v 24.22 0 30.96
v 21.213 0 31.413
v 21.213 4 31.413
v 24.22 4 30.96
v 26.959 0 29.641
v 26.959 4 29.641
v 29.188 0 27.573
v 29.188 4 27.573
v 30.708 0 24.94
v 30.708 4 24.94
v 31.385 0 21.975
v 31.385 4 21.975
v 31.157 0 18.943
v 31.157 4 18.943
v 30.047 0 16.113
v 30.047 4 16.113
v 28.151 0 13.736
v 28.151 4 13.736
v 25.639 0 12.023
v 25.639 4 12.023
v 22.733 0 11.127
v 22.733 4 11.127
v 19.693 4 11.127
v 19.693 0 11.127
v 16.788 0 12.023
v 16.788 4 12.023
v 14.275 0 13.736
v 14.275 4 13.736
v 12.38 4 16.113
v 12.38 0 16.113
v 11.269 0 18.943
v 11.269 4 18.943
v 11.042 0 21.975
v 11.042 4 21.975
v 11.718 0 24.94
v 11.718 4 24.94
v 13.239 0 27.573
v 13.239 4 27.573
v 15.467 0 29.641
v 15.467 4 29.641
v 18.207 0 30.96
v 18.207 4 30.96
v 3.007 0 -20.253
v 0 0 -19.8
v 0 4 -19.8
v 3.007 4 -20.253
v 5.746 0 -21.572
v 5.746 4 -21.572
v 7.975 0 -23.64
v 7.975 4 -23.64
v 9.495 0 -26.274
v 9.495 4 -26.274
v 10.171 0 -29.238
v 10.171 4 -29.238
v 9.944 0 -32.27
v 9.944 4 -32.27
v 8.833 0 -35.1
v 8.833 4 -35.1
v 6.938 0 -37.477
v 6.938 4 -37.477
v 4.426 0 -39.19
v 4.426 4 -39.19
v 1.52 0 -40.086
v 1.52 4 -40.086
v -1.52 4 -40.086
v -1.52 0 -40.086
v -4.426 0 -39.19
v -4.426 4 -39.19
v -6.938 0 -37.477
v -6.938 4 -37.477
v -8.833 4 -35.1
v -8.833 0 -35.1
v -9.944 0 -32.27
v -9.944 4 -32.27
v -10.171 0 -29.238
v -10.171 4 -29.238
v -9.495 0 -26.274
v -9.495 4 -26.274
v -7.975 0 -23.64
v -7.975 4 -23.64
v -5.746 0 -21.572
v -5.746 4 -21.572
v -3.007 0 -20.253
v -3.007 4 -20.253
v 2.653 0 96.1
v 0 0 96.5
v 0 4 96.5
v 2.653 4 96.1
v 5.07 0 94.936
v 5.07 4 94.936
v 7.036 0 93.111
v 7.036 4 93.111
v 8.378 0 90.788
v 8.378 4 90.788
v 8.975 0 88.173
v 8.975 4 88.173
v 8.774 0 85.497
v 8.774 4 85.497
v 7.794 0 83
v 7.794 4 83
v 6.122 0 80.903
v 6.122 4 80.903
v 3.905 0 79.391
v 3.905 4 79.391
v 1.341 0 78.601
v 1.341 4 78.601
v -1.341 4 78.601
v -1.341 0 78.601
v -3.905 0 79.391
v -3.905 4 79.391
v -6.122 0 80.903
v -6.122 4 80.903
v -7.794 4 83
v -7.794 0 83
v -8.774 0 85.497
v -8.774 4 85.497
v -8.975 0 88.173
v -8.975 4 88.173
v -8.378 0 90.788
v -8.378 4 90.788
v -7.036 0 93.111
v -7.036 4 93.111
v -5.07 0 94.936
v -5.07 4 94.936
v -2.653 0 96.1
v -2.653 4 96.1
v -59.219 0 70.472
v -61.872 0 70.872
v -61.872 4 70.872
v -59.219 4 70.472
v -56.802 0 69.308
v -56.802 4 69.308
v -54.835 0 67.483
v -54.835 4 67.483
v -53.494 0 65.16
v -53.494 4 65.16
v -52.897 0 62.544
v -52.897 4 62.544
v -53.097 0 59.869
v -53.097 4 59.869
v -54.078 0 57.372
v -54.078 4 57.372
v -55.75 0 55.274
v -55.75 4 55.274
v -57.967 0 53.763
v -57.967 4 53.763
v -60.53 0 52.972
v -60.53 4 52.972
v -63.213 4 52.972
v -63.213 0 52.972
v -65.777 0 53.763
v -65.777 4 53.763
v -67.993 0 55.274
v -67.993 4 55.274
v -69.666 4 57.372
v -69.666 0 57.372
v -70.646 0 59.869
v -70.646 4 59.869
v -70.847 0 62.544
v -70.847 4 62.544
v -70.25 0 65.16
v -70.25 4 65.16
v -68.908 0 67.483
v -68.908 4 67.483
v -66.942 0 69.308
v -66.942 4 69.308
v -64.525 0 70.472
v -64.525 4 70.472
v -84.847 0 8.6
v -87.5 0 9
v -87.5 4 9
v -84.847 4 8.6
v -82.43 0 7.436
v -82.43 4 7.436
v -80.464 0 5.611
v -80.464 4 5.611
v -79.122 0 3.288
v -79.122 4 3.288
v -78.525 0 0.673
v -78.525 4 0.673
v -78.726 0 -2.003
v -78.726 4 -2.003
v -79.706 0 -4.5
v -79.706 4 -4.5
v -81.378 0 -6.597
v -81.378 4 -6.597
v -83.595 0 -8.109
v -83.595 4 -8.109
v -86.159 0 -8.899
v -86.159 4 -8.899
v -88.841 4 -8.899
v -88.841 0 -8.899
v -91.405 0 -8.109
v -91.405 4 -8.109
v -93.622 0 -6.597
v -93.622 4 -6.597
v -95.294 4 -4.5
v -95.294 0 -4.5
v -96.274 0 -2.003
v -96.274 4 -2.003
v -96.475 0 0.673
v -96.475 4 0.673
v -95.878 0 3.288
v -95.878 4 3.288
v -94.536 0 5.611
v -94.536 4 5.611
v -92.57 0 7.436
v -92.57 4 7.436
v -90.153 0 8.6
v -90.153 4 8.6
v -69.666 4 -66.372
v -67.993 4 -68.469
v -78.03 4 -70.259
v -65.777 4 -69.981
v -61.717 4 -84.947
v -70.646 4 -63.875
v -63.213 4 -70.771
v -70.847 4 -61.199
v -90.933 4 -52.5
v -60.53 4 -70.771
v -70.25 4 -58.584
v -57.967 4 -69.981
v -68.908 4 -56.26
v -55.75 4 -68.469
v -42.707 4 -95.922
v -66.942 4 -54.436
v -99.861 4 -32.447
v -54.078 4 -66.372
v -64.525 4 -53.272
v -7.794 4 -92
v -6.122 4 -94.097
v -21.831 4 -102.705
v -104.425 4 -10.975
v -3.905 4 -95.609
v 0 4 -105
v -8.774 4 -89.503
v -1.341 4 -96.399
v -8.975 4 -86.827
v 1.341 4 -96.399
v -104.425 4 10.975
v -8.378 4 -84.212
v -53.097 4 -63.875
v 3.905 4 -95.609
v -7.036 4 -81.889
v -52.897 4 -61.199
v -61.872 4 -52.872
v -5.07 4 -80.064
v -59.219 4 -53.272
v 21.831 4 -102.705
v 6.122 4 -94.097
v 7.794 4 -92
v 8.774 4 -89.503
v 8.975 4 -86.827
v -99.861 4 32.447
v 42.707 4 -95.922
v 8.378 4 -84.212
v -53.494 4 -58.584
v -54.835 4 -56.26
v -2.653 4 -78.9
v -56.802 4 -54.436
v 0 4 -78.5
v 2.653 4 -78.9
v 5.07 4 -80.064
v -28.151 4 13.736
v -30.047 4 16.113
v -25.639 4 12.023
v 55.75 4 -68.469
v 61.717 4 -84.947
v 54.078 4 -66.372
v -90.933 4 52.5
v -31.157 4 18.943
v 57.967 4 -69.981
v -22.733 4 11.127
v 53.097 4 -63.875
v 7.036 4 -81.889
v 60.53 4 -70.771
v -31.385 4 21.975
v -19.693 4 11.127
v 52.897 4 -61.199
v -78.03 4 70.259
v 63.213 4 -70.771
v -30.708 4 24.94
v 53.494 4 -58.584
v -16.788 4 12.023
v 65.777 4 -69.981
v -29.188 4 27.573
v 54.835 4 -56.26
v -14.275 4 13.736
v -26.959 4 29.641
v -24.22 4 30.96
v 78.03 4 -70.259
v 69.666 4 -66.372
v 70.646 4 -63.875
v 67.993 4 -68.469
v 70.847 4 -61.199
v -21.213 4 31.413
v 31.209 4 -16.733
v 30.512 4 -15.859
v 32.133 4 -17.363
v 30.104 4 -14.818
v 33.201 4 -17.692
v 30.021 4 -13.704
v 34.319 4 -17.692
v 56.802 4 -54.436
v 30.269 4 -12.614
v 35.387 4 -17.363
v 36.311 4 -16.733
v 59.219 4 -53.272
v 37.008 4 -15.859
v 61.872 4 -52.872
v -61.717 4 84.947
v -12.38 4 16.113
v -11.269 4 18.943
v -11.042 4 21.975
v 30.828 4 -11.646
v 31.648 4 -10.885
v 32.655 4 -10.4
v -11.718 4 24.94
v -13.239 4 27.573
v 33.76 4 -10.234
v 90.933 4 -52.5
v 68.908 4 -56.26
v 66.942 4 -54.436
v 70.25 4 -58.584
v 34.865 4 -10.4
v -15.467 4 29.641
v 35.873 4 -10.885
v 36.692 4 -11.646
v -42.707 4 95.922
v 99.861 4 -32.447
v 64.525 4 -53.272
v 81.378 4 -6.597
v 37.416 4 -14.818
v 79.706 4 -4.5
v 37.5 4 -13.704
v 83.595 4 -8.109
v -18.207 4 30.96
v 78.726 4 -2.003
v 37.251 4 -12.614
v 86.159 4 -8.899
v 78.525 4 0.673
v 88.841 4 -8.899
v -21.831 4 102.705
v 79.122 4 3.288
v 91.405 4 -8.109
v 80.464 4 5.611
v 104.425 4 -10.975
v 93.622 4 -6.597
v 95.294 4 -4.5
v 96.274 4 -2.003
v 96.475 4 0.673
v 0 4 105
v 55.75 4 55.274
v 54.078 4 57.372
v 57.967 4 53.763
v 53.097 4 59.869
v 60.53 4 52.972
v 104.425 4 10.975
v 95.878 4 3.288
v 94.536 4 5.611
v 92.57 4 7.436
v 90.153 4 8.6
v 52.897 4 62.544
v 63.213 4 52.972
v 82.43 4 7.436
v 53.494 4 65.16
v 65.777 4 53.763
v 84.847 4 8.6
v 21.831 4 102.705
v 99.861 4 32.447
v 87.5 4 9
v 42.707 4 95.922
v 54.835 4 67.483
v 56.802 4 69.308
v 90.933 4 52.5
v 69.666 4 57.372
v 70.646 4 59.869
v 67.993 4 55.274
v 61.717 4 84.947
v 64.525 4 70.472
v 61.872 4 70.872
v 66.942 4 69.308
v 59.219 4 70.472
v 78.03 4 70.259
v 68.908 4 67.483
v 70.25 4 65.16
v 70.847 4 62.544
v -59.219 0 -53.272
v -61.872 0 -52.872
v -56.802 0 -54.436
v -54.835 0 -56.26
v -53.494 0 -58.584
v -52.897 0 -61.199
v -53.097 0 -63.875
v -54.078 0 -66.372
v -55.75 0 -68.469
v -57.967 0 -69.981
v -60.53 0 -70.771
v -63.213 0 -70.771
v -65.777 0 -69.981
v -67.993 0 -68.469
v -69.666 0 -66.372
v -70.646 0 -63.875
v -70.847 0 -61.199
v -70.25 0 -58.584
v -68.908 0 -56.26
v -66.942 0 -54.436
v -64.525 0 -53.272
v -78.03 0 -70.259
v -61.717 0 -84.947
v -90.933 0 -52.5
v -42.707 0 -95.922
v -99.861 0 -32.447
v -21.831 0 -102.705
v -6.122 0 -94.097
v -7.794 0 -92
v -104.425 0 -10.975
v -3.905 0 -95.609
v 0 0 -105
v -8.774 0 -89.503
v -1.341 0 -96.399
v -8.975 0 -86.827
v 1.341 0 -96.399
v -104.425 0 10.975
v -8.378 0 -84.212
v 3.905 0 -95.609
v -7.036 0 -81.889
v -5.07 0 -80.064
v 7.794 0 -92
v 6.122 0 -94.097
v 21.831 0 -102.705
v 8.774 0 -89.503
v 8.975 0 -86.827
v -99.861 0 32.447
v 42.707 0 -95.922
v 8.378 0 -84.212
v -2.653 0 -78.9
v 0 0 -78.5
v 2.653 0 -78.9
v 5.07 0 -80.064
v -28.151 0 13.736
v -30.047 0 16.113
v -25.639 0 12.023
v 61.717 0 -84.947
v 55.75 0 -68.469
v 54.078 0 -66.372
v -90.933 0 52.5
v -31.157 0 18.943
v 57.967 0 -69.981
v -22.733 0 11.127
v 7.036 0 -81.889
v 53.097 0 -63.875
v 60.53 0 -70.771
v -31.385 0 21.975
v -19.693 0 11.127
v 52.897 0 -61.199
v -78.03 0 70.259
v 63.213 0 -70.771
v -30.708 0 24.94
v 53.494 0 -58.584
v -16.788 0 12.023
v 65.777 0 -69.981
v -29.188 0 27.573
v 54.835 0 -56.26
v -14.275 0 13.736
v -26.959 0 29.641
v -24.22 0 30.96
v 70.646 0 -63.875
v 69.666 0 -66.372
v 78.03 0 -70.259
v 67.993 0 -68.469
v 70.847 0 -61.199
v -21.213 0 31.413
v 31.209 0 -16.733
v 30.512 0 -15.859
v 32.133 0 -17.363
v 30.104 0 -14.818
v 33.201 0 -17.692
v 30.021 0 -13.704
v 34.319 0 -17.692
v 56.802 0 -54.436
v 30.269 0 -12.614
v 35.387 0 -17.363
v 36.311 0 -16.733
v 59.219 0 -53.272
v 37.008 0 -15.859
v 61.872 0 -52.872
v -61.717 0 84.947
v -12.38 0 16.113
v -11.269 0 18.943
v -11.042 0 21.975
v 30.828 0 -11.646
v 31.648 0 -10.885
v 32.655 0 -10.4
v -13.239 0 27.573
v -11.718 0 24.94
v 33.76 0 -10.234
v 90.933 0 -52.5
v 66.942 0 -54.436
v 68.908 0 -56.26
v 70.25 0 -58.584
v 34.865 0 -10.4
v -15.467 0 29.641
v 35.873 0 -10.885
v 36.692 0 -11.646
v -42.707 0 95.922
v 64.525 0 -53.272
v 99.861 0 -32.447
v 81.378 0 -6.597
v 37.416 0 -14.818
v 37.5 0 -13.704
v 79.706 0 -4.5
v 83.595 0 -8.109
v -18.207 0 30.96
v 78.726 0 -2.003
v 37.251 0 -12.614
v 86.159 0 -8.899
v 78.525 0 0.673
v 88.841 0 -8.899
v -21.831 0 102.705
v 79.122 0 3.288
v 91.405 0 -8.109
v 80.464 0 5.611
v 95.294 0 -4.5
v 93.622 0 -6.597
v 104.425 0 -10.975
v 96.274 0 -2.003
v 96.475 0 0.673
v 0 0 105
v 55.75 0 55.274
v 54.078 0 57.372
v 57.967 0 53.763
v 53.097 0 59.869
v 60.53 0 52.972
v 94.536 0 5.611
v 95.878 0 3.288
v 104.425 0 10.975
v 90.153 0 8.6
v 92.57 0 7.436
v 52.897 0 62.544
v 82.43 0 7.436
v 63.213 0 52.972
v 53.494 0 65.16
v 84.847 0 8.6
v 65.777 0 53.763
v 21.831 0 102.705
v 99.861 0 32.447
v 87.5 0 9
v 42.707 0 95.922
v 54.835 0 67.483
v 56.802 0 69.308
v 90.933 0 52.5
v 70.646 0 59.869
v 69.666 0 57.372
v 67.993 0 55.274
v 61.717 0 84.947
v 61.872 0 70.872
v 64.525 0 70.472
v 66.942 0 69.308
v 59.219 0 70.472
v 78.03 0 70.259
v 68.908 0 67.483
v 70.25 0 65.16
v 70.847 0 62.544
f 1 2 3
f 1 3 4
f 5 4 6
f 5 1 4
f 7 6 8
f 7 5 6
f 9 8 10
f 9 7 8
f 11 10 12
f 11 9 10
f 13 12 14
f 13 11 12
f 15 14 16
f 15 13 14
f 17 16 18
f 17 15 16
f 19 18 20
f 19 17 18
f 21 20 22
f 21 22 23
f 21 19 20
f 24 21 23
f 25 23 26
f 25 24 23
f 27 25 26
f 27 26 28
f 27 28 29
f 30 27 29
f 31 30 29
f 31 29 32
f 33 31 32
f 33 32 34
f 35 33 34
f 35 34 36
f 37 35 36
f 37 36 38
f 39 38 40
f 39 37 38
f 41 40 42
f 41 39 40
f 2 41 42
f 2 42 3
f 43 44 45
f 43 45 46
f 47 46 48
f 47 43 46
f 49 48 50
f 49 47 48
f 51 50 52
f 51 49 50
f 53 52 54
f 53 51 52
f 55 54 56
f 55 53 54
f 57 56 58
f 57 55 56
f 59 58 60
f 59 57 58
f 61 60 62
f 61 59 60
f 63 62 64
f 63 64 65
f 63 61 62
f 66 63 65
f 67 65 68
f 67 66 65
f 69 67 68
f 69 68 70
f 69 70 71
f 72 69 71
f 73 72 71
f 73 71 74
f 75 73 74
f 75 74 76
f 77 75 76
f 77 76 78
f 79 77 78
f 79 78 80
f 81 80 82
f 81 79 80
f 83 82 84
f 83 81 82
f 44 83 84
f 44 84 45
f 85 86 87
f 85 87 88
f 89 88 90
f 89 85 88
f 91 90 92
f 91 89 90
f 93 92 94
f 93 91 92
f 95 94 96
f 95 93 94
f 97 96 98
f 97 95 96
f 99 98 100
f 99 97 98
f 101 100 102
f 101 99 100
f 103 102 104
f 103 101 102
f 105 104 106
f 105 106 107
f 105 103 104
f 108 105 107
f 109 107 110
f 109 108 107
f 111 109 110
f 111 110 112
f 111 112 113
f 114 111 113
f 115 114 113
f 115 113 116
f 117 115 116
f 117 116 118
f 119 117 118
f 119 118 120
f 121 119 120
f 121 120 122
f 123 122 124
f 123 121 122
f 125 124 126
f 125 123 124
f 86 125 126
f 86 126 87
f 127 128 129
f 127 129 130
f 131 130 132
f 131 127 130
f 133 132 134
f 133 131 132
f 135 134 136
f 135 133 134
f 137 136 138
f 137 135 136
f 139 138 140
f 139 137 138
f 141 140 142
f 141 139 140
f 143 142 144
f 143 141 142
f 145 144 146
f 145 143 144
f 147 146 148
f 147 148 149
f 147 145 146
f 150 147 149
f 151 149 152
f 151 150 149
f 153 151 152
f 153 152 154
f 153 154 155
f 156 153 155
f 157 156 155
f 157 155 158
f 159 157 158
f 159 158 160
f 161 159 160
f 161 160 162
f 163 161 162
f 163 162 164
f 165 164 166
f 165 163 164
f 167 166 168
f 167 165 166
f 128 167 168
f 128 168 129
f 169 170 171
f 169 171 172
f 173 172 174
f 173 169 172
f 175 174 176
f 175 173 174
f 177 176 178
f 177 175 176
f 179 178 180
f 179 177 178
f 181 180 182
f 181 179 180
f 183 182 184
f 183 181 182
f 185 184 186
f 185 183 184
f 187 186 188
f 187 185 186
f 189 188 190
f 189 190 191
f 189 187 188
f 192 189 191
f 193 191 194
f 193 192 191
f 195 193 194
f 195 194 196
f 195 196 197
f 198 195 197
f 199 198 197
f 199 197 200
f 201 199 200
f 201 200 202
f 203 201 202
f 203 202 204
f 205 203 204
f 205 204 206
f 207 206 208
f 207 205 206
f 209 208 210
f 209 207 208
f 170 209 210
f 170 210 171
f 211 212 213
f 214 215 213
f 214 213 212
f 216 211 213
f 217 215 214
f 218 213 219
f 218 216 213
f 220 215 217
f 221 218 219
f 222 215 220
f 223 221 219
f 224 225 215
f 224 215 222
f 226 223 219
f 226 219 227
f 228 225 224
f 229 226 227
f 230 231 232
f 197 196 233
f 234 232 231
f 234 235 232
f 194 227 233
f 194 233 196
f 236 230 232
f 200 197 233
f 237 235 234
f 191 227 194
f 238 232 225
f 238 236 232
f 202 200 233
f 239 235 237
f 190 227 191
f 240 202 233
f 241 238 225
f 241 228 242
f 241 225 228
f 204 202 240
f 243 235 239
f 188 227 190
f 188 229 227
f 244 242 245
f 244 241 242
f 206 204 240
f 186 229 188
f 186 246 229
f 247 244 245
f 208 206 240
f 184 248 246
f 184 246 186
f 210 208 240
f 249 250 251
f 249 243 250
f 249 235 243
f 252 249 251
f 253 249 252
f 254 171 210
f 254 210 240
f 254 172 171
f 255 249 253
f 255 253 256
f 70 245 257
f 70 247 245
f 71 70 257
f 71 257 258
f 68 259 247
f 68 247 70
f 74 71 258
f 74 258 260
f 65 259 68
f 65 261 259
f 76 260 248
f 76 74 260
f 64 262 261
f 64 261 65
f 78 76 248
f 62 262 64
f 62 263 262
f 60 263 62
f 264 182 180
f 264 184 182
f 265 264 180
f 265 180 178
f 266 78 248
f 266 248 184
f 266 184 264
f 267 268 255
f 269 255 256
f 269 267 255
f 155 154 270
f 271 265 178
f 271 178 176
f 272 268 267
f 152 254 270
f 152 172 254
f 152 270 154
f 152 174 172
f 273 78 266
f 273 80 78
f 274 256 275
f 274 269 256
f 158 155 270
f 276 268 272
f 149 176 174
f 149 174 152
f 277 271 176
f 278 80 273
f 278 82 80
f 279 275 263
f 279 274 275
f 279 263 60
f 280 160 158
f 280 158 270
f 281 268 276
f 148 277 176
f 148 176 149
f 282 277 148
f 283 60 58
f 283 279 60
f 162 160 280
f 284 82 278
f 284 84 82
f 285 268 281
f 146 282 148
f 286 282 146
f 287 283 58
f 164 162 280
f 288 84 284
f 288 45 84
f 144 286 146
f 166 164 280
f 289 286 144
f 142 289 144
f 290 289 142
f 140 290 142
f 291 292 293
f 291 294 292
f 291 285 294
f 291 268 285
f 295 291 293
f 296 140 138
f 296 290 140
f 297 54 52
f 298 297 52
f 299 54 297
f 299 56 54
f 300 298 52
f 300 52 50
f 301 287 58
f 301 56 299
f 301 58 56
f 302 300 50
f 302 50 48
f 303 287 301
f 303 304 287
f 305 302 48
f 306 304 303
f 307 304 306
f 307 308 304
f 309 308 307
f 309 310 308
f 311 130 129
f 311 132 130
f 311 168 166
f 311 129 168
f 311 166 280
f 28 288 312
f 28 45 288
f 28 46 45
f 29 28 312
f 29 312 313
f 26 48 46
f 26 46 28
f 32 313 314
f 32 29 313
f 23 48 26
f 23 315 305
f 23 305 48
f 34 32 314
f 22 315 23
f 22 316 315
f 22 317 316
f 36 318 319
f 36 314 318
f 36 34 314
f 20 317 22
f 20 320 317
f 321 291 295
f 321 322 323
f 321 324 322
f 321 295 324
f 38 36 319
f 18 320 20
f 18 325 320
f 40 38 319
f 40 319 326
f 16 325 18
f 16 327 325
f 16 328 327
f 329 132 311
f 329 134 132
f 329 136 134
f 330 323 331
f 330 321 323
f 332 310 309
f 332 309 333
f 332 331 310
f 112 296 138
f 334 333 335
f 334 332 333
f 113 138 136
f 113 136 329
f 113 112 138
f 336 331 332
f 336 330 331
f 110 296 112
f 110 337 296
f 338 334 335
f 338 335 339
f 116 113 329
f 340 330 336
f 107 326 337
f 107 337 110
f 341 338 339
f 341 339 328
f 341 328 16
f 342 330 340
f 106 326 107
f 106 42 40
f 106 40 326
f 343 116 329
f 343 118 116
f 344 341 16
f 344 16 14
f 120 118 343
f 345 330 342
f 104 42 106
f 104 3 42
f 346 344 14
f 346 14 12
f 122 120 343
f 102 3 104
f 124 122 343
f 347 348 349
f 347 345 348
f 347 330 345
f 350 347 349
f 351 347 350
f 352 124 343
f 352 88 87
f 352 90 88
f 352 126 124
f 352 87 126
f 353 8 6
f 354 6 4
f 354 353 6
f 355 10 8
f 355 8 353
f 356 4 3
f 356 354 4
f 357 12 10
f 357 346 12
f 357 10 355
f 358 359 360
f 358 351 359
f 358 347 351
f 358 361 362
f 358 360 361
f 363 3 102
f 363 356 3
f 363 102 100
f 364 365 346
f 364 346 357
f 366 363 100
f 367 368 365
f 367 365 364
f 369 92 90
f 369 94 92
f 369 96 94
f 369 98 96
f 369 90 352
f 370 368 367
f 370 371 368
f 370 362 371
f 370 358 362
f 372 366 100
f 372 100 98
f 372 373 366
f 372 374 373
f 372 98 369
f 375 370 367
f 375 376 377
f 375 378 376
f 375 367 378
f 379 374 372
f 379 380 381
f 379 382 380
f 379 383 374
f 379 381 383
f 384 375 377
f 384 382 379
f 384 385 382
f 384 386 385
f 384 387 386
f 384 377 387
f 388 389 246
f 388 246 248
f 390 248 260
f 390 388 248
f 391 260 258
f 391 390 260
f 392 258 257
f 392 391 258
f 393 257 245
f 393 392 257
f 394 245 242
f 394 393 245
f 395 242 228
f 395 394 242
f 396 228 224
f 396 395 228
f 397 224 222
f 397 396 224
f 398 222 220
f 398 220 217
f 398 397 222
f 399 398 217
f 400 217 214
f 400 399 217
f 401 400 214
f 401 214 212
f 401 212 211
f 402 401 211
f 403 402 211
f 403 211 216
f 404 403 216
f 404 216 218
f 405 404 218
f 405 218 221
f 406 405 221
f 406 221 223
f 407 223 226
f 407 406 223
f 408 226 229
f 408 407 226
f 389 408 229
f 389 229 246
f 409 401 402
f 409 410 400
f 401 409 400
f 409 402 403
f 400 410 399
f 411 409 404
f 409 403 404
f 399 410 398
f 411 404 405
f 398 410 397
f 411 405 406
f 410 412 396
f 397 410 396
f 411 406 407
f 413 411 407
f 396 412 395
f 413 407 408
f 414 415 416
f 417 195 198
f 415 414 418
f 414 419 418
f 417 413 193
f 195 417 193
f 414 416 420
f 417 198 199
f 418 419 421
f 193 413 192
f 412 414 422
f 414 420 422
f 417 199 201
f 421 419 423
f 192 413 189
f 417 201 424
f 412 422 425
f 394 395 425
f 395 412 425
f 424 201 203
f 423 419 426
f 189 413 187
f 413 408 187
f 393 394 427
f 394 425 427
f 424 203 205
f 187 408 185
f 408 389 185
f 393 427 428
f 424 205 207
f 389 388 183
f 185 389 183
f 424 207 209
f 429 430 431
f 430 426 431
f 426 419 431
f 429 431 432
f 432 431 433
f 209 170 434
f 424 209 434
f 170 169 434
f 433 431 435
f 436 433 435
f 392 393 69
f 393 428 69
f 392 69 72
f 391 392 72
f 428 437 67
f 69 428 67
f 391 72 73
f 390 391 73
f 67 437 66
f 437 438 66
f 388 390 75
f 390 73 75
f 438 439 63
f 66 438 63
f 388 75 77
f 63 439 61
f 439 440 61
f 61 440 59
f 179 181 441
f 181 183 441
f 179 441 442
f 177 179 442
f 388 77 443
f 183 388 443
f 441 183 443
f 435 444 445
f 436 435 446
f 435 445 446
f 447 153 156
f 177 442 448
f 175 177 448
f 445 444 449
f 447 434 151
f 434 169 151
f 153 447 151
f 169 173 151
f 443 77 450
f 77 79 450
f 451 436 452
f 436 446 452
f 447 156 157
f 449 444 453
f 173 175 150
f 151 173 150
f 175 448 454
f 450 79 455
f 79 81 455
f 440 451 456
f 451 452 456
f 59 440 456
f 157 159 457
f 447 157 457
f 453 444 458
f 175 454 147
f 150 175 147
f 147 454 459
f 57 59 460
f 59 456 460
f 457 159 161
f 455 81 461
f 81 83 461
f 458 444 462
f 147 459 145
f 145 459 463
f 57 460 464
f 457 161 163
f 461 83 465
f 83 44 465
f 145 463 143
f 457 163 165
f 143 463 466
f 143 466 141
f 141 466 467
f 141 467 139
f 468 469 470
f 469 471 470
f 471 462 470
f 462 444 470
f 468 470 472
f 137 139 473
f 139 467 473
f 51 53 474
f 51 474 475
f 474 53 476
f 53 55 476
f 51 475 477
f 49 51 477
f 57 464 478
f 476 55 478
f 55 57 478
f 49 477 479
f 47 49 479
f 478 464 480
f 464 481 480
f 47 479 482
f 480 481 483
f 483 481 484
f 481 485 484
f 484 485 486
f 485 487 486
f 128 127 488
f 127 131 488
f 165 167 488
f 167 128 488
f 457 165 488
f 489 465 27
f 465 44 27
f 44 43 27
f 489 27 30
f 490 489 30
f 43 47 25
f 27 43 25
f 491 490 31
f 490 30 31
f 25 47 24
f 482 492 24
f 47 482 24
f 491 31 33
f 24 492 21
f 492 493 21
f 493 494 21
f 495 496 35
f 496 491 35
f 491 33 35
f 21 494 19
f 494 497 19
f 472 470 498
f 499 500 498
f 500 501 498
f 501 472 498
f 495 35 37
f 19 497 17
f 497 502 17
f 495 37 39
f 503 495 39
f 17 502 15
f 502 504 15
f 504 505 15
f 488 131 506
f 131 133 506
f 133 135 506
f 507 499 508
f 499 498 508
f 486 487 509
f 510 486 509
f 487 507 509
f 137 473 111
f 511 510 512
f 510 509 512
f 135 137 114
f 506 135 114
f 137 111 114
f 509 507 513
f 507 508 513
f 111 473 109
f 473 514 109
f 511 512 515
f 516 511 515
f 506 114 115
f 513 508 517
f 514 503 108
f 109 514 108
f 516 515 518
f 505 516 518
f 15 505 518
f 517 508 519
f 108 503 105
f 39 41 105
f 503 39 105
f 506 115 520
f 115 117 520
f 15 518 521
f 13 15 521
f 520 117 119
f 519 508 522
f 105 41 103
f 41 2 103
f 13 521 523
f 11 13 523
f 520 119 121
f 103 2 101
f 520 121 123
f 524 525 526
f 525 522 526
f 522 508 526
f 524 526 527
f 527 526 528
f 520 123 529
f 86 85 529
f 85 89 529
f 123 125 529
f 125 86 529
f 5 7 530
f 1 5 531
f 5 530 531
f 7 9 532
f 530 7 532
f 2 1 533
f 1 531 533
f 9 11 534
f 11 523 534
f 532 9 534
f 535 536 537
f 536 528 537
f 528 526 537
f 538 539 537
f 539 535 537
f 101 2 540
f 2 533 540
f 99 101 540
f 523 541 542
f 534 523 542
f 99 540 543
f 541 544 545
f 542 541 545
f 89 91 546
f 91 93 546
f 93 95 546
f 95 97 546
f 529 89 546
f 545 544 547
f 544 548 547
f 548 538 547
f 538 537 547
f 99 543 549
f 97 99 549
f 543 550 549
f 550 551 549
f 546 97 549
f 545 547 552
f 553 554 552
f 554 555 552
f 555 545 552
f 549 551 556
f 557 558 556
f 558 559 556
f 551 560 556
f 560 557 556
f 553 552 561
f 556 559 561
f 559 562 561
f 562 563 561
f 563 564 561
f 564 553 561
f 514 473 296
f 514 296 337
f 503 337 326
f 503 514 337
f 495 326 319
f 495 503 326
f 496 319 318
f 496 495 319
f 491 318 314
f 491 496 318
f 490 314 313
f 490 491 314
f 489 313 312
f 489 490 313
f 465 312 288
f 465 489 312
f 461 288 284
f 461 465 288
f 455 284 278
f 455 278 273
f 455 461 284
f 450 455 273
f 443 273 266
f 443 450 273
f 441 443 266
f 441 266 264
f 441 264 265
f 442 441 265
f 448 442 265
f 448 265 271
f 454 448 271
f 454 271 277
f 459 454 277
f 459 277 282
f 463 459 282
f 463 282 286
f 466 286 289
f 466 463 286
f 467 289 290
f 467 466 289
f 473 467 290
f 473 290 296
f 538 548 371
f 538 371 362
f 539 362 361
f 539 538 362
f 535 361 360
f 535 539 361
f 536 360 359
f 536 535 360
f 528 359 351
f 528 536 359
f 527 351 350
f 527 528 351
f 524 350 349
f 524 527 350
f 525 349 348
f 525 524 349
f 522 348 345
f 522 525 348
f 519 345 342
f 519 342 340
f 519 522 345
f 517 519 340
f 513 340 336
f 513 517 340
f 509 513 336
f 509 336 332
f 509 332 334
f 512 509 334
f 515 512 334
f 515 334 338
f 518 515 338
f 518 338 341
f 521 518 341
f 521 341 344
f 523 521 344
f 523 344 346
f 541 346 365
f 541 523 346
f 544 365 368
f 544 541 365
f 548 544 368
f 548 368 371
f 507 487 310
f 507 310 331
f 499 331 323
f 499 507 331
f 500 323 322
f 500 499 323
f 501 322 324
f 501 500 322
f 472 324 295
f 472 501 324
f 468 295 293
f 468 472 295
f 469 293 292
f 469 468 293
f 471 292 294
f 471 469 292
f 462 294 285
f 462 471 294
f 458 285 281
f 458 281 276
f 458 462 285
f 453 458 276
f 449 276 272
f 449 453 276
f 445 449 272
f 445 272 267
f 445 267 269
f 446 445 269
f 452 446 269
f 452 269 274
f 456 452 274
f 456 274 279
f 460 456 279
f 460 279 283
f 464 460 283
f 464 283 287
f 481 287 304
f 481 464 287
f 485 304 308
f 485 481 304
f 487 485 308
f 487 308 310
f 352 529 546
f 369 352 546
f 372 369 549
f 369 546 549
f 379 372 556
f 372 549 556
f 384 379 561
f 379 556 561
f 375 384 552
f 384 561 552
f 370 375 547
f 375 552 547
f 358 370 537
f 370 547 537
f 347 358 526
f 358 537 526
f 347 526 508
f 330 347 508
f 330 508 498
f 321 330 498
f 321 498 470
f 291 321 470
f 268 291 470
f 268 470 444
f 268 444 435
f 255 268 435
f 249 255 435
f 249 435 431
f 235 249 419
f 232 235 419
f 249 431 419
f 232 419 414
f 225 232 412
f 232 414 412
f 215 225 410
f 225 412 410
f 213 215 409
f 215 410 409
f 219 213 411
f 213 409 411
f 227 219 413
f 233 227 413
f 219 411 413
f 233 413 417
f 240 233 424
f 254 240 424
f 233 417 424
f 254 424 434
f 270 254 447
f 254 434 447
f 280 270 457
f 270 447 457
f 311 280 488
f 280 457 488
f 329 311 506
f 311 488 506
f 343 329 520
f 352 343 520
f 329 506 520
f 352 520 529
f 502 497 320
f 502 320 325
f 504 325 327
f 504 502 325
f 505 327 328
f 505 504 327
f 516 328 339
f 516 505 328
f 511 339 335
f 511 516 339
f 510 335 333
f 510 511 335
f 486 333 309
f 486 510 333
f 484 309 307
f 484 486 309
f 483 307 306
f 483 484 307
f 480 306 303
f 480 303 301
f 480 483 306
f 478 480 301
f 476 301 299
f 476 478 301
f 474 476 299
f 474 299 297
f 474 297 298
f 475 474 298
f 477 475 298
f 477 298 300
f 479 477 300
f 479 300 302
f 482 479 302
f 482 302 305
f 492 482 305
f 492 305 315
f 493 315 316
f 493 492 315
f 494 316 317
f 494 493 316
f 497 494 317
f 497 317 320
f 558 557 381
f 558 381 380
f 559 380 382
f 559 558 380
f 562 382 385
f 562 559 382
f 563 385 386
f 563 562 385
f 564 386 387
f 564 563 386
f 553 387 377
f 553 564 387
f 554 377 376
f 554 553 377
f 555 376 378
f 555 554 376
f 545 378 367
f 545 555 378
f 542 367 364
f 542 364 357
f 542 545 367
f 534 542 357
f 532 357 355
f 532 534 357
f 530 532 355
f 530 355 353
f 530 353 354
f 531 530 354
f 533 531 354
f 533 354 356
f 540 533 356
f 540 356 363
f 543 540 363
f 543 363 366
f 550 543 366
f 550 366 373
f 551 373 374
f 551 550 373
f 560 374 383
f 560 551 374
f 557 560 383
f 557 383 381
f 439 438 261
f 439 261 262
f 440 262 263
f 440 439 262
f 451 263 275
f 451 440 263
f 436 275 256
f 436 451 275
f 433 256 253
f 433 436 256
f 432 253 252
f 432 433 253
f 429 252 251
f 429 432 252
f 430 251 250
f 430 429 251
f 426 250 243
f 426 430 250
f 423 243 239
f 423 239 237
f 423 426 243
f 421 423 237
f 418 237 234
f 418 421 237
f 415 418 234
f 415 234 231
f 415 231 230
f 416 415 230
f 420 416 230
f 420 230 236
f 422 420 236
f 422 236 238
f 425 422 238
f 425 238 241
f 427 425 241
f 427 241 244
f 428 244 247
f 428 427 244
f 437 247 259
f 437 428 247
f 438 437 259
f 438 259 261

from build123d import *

# Parameters (mm, degrees)
SKETCH3_R           = 105
SKETCH3_R_2         = 10.2
SKETCH3_R_3         = 9
SKETCH3_R_4         = 3.75
BOSS_EXTRUDE1_DEPTH = 4


with BuildPart() as part:
    # Sketch3 → Boss-Extrude1 (new body)
    with BuildSketch(Plane(origin=(0, 0, 0), x_dir=(1, 0, 0), z_dir=(0, 1, 0))):
        with Locations(Location((0, 0, 0), (0, 0, 270))):
            Circle(SKETCH3_R)
        with Locations(Location((0, 30, 0), (0, 0, 270))):
            Circle(SKETCH3_R_2, mode=Mode.SUBTRACT)
        with Locations(Location((61.871843354, 61.871843354, 0), (0, 0, 270))):
            Circle(SKETCH3_R_3, mode=Mode.SUBTRACT)
        with Locations(Location((0, 87.5, 0), (0, 0, 270))):
            Circle(SKETCH3_R_3, mode=Mode.SUBTRACT)
        with Locations(Location((-61.871843354, 61.871843354, 0), (0, 0, 270))):
            Circle(SKETCH3_R_3, mode=Mode.SUBTRACT)
        with Locations(Location((-87.5, 0, 0), (0, 0, 270))):
            Circle(SKETCH3_R_3, mode=Mode.SUBTRACT)
        with Locations(Location((-61.871843354, -61.871843354, 0), (0, 0, 270))):
            Circle(SKETCH3_R_3, mode=Mode.SUBTRACT)
        with Locations(Location((0, -87.5, 0), (0, 0, 270))):
            Circle(SKETCH3_R_3, mode=Mode.SUBTRACT)
        with Locations(Location((61.871843354, -61.871843354, 0), (0, 0, 270))):
            Circle(SKETCH3_R_3, mode=Mode.SUBTRACT)
        with Locations(Location((87.5, 0, 0), (0, 0, 270))):
            Circle(SKETCH3_R_3, mode=Mode.SUBTRACT)
        with Locations(Location((-21.213203436, -21.213203436, 0), (0, 0, 270))):
            Circle(SKETCH3_R_2, mode=Mode.SUBTRACT)
        with Locations(Location((33.760092737, 13.983888279, 0), (0, 0, 270))):
            Circle(SKETCH3_R_4, mode=Mode.SUBTRACT)
        with Locations(Location((21.213203436, -21.213203436, 0), (0, 0, 270))):
            Circle(SKETCH3_R_2, mode=Mode.SUBTRACT)
    extrude(amount=BOSS_EXTRUDE1_DEPTH)


solid = part.part
